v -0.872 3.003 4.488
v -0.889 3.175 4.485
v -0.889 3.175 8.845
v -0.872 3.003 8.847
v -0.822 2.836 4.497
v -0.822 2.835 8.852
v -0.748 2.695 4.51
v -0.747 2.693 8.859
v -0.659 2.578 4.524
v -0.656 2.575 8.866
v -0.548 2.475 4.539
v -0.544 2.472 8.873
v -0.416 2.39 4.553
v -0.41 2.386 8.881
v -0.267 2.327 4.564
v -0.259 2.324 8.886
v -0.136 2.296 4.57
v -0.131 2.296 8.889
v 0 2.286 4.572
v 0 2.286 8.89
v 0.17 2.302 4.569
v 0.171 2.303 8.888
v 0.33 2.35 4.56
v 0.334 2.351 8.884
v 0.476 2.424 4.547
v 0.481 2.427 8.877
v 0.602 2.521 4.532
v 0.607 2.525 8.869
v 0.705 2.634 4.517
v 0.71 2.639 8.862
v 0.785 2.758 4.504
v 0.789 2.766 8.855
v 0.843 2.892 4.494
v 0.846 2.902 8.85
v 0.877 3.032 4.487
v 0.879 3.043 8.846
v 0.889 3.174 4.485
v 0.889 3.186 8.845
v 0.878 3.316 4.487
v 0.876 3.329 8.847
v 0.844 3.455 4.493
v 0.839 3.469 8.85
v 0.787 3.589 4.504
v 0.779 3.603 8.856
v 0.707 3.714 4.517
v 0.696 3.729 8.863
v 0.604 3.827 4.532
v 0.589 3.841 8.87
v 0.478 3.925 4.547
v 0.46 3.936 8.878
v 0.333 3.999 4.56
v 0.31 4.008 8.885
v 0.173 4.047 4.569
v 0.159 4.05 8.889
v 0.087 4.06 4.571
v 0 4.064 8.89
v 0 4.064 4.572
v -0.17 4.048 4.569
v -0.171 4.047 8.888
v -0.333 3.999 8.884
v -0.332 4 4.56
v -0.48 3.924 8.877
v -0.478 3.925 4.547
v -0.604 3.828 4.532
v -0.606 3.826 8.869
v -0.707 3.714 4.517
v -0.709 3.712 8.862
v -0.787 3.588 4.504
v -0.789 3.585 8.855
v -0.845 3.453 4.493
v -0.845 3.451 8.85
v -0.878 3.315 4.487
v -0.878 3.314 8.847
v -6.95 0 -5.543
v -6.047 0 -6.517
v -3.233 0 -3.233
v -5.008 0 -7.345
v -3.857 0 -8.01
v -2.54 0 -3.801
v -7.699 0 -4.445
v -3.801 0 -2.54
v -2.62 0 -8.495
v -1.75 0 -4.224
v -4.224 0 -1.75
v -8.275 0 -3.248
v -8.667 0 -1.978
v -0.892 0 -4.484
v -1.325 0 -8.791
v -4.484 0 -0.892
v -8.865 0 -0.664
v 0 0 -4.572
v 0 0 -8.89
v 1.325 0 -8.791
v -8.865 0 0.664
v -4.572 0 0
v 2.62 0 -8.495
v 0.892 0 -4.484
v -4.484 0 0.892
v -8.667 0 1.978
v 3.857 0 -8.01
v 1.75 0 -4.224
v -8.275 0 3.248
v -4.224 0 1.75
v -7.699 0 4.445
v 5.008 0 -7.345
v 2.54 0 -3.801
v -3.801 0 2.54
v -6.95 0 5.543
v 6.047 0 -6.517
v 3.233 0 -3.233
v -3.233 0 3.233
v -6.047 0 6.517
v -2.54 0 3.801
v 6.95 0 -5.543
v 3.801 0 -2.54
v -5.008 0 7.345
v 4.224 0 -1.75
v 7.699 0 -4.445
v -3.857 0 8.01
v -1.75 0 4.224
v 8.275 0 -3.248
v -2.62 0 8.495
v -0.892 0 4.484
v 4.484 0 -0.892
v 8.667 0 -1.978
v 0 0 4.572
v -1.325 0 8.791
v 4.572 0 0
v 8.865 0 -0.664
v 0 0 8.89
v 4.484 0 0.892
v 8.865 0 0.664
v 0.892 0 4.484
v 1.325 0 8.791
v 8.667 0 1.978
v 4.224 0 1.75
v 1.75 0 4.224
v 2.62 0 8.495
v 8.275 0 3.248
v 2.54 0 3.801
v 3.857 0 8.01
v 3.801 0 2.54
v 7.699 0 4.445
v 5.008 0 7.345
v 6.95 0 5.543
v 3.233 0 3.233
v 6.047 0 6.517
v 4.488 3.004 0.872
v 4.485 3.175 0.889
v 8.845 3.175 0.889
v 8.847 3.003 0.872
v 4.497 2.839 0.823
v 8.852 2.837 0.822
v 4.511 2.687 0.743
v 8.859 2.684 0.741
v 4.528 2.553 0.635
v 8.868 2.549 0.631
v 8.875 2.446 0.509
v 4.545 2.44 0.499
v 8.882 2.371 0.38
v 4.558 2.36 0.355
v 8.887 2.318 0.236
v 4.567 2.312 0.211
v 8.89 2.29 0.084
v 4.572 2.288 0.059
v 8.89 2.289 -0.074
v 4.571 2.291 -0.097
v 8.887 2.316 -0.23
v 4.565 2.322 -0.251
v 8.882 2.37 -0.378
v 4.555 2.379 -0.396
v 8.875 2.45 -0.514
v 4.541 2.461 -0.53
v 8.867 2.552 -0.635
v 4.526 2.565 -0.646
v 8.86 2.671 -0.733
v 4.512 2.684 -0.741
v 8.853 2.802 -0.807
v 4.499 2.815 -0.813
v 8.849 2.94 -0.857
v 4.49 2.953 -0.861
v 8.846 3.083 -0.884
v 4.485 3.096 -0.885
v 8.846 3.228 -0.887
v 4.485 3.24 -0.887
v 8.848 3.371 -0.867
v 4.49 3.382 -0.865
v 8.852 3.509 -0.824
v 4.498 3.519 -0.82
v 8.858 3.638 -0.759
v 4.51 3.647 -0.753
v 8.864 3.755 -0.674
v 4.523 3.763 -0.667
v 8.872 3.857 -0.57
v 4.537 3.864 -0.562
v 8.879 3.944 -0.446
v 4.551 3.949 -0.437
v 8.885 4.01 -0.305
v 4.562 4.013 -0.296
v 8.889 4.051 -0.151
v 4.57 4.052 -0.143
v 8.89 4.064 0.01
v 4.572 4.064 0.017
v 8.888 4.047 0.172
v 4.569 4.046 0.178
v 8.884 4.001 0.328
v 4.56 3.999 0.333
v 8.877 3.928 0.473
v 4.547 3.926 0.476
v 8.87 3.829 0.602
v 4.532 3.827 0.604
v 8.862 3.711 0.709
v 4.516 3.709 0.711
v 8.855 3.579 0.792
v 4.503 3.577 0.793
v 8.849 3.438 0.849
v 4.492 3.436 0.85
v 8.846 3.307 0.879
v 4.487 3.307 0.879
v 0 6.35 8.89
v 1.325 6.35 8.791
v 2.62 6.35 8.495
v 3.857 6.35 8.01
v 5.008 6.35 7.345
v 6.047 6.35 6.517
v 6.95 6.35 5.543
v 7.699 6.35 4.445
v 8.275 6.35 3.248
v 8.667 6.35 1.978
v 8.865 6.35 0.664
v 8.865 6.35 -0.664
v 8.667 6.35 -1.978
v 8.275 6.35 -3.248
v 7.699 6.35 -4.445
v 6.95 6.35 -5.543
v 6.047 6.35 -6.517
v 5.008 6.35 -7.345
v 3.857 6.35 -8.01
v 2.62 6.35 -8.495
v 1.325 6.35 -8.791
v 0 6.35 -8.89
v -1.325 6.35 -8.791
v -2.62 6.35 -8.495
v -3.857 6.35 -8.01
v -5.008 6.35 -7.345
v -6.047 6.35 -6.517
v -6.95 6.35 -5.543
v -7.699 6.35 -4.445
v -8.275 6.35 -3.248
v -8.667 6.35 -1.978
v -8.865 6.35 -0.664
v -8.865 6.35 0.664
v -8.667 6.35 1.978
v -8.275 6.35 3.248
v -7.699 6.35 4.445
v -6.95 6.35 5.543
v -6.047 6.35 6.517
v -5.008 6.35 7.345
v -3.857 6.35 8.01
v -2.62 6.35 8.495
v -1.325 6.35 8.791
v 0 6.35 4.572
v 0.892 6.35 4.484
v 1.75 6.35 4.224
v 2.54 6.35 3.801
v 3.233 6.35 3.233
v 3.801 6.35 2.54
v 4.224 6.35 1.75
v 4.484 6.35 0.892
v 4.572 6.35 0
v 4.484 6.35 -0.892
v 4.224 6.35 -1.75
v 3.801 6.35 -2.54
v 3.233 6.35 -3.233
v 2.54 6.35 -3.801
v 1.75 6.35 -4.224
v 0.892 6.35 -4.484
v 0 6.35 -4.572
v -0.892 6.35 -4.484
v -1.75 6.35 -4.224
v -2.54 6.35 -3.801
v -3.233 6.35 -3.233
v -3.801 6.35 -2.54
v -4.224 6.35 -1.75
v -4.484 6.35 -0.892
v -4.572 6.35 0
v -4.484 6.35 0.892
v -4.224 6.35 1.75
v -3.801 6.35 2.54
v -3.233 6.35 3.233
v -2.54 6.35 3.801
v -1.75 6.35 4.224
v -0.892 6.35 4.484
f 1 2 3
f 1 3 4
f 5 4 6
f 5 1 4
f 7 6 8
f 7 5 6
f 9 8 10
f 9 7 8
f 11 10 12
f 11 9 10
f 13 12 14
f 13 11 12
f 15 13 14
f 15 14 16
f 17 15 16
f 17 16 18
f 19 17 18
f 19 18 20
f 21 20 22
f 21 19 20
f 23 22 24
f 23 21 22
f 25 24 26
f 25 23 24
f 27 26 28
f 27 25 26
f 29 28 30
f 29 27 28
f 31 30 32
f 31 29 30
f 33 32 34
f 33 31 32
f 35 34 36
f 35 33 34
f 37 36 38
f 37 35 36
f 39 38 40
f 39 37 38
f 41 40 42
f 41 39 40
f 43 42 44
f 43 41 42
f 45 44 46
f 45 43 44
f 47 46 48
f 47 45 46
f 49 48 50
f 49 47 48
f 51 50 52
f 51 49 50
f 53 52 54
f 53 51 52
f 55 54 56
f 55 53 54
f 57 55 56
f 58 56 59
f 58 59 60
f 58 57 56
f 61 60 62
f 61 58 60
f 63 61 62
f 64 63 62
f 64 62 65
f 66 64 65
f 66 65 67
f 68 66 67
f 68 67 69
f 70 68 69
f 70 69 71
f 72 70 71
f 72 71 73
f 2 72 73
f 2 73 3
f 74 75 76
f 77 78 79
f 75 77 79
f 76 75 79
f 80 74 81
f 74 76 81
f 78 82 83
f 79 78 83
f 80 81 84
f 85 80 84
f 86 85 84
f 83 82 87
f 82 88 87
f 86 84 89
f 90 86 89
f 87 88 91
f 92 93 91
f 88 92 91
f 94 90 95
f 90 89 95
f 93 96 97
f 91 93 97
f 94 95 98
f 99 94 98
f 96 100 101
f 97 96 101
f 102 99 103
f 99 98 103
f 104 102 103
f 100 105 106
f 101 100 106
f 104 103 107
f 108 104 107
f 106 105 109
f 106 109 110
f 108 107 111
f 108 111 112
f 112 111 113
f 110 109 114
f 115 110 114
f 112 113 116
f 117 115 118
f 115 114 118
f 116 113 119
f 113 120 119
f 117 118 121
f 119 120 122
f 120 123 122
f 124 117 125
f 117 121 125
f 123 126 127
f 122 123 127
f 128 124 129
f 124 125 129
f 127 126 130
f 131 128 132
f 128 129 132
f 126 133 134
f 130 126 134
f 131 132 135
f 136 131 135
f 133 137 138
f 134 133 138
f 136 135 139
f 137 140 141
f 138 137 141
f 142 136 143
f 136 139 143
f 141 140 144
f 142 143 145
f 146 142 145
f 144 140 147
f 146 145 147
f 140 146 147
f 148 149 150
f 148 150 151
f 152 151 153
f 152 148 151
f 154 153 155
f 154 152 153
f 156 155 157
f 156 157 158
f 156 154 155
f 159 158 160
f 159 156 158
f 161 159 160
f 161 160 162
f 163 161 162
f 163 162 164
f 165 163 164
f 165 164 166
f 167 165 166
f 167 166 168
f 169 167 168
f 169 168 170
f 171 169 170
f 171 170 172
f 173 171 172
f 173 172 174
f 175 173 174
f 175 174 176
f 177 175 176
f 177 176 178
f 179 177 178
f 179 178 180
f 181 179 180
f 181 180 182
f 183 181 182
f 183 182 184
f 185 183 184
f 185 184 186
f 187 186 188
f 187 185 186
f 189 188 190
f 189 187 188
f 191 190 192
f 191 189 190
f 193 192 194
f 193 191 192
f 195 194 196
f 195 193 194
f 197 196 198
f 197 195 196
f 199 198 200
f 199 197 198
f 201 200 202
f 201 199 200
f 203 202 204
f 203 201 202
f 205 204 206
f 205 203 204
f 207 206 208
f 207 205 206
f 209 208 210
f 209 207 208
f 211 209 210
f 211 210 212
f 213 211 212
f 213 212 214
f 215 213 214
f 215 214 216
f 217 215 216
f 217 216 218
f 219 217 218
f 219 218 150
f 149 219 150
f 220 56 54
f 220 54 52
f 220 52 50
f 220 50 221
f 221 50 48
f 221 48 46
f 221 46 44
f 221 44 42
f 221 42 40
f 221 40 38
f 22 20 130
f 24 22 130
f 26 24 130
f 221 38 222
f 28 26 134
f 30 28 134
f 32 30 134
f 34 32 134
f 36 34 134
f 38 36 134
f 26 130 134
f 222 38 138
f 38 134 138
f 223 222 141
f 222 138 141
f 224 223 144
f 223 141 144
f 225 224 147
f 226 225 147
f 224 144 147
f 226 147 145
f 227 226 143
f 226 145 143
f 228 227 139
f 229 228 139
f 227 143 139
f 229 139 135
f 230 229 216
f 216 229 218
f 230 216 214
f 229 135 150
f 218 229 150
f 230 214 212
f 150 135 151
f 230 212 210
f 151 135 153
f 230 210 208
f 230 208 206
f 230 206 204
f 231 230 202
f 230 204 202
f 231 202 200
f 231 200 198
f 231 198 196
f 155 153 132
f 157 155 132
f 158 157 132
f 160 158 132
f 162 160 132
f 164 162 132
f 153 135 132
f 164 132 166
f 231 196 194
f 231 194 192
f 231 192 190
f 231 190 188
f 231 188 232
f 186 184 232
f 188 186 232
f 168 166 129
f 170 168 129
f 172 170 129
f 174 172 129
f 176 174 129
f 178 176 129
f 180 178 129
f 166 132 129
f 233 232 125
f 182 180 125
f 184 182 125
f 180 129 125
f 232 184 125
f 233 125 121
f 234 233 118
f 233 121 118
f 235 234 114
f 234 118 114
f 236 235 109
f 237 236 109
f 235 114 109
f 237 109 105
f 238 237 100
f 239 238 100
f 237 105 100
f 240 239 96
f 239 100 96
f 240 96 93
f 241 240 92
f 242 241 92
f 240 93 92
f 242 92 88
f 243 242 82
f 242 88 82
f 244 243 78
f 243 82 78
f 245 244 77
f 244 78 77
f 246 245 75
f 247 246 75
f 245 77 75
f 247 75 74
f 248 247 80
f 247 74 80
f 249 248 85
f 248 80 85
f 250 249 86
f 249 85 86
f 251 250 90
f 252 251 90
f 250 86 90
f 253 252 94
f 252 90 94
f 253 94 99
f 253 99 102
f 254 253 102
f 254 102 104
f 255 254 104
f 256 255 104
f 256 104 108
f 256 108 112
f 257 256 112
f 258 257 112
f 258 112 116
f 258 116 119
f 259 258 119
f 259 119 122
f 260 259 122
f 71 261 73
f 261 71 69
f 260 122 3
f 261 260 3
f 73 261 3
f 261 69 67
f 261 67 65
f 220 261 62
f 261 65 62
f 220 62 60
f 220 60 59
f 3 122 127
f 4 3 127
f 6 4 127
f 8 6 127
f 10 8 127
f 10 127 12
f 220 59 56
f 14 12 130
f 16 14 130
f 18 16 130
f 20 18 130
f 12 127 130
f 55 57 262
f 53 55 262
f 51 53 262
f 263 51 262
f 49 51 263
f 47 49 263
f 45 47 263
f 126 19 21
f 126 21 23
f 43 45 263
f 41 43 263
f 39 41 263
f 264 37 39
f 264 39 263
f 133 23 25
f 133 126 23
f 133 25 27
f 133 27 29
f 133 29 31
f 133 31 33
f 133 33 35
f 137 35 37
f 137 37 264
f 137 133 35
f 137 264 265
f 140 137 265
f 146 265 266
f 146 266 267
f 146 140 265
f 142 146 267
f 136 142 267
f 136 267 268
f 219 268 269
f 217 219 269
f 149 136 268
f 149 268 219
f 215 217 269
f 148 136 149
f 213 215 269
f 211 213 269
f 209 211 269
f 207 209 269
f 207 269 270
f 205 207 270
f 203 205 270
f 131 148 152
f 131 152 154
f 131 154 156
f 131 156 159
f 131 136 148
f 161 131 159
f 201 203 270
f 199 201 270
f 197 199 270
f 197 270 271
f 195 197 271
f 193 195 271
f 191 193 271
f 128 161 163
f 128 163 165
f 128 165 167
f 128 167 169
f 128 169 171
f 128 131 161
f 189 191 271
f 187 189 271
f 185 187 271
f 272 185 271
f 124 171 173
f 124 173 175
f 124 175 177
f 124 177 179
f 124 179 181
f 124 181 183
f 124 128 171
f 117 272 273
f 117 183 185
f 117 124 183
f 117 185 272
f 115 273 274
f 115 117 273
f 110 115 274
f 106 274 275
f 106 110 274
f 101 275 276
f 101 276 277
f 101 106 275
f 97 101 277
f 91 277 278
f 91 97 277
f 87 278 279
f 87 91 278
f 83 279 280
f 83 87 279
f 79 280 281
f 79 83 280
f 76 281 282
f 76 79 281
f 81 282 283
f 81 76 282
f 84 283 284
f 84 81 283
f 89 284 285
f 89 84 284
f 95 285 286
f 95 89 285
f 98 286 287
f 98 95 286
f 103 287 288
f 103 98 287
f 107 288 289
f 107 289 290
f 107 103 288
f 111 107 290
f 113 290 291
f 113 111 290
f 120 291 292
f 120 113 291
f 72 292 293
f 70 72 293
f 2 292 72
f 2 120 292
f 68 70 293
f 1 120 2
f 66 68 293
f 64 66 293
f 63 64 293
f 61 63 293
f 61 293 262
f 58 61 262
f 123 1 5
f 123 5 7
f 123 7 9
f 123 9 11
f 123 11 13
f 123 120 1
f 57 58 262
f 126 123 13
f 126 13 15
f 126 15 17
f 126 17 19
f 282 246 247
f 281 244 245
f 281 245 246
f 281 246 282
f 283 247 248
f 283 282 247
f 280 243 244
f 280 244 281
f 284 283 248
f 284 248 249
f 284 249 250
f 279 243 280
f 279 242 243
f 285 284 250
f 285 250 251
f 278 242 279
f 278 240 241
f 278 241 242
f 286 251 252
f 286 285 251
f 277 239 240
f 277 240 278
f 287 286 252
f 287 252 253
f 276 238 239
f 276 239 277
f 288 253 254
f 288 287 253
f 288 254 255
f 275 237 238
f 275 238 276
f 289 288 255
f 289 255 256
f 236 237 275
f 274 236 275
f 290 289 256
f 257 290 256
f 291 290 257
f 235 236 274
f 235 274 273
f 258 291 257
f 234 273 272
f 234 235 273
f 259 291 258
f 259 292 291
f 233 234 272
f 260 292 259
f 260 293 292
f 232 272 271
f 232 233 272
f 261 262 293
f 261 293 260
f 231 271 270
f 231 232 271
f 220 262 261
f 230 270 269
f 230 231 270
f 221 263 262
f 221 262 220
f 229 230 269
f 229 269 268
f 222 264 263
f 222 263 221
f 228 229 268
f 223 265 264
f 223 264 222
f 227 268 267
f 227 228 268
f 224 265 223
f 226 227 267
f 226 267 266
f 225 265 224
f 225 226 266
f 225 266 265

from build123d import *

# Parameters (mm, degrees)
SKETCH1_R               = 8.89
SKETCH1_R_2             = 4.572
BOSS_EXTRUDE1_DEPTH     = 6.35
CUT_EXTRUDE1_REACH      = 16.085
CUT_EXTRUDE1_END_RADIUS = 8.89
SKETCH2_R               = 0.889
CUT_EXTRUDE2_REACH      = 16.085
CUT_EXTRUDE2_END_RADIUS = 8.89
SKETCH3_R               = 0.889


with BuildPart() as part:
    # Sketch1 → Boss-Extrude1 (new body)
    with BuildSketch(Plane(origin=(0, 0, 0), x_dir=(1, 0, 0), z_dir=(0, 1, 0))):
        with Locations(Location((0, 0, 0), (0, 0, 270))):
            Circle(SKETCH1_R)
        with Locations(Location((0, 0, 0), (0, 0, 270))):
            Circle(SKETCH1_R_2, mode=Mode.SUBTRACT)
    extrude(amount=BOSS_EXTRUDE1_DEPTH)

    # Cut-Extrude1: up to this cylinder (the profile starts inside it)
    cut_extrude1_end = Plane(origin=(0, 3.175, 0), z_dir=(0, -1, 0)) * Cylinder(CUT_EXTRUDE1_END_RADIUS, 50.95, mode=Mode.PRIVATE)
    # Sketch2 → Cut-Extrude1 (cut, up to the surface)
    with BuildSketch(Plane(origin=(0, 0, 0), x_dir=(0, 0, -1), z_dir=(1, 0, 0)), mode=Mode.PRIVATE) as cut_extrude1_sk1:
        with Locations(Location((0, 3.175, 0), (0, 0, 180))):
            Circle(SKETCH2_R)
    cut_extrude1_tool1 = extrude(cut_extrude1_sk1.sketch, amount=CUT_EXTRUDE1_REACH, mode=Mode.PRIVATE) & cut_extrude1_end
    add(cut_extrude1_tool1.solids().sort_by_distance((0, 3.175, 0))[0], mode=Mode.SUBTRACT)

    # Cut-Extrude2: up to this cylinder (the profile starts inside it)
    cut_extrude2_end = Plane(origin=(0, 3.175, 0), z_dir=(0, -1, 0)) * Cylinder(CUT_EXTRUDE2_END_RADIUS, 50.95, mode=Mode.PRIVATE)
    # Sketch3 → Cut-Extrude2 (cut, up to the surface)
    with BuildSketch(Plane.XY, mode=Mode.PRIVATE) as cut_extrude2_sk1:
        with Locations(Location((0, 3.175, 0), (0, 0, 180))):
            Circle(SKETCH3_R)
    cut_extrude2_tool1 = extrude(cut_extrude2_sk1.sketch, amount=CUT_EXTRUDE2_REACH, mode=Mode.PRIVATE) & cut_extrude2_end
    add(cut_extrude2_tool1.solids().sort_by_distance((0, 3.175, 0))[0], mode=Mode.SUBTRACT)


solid = part.part
